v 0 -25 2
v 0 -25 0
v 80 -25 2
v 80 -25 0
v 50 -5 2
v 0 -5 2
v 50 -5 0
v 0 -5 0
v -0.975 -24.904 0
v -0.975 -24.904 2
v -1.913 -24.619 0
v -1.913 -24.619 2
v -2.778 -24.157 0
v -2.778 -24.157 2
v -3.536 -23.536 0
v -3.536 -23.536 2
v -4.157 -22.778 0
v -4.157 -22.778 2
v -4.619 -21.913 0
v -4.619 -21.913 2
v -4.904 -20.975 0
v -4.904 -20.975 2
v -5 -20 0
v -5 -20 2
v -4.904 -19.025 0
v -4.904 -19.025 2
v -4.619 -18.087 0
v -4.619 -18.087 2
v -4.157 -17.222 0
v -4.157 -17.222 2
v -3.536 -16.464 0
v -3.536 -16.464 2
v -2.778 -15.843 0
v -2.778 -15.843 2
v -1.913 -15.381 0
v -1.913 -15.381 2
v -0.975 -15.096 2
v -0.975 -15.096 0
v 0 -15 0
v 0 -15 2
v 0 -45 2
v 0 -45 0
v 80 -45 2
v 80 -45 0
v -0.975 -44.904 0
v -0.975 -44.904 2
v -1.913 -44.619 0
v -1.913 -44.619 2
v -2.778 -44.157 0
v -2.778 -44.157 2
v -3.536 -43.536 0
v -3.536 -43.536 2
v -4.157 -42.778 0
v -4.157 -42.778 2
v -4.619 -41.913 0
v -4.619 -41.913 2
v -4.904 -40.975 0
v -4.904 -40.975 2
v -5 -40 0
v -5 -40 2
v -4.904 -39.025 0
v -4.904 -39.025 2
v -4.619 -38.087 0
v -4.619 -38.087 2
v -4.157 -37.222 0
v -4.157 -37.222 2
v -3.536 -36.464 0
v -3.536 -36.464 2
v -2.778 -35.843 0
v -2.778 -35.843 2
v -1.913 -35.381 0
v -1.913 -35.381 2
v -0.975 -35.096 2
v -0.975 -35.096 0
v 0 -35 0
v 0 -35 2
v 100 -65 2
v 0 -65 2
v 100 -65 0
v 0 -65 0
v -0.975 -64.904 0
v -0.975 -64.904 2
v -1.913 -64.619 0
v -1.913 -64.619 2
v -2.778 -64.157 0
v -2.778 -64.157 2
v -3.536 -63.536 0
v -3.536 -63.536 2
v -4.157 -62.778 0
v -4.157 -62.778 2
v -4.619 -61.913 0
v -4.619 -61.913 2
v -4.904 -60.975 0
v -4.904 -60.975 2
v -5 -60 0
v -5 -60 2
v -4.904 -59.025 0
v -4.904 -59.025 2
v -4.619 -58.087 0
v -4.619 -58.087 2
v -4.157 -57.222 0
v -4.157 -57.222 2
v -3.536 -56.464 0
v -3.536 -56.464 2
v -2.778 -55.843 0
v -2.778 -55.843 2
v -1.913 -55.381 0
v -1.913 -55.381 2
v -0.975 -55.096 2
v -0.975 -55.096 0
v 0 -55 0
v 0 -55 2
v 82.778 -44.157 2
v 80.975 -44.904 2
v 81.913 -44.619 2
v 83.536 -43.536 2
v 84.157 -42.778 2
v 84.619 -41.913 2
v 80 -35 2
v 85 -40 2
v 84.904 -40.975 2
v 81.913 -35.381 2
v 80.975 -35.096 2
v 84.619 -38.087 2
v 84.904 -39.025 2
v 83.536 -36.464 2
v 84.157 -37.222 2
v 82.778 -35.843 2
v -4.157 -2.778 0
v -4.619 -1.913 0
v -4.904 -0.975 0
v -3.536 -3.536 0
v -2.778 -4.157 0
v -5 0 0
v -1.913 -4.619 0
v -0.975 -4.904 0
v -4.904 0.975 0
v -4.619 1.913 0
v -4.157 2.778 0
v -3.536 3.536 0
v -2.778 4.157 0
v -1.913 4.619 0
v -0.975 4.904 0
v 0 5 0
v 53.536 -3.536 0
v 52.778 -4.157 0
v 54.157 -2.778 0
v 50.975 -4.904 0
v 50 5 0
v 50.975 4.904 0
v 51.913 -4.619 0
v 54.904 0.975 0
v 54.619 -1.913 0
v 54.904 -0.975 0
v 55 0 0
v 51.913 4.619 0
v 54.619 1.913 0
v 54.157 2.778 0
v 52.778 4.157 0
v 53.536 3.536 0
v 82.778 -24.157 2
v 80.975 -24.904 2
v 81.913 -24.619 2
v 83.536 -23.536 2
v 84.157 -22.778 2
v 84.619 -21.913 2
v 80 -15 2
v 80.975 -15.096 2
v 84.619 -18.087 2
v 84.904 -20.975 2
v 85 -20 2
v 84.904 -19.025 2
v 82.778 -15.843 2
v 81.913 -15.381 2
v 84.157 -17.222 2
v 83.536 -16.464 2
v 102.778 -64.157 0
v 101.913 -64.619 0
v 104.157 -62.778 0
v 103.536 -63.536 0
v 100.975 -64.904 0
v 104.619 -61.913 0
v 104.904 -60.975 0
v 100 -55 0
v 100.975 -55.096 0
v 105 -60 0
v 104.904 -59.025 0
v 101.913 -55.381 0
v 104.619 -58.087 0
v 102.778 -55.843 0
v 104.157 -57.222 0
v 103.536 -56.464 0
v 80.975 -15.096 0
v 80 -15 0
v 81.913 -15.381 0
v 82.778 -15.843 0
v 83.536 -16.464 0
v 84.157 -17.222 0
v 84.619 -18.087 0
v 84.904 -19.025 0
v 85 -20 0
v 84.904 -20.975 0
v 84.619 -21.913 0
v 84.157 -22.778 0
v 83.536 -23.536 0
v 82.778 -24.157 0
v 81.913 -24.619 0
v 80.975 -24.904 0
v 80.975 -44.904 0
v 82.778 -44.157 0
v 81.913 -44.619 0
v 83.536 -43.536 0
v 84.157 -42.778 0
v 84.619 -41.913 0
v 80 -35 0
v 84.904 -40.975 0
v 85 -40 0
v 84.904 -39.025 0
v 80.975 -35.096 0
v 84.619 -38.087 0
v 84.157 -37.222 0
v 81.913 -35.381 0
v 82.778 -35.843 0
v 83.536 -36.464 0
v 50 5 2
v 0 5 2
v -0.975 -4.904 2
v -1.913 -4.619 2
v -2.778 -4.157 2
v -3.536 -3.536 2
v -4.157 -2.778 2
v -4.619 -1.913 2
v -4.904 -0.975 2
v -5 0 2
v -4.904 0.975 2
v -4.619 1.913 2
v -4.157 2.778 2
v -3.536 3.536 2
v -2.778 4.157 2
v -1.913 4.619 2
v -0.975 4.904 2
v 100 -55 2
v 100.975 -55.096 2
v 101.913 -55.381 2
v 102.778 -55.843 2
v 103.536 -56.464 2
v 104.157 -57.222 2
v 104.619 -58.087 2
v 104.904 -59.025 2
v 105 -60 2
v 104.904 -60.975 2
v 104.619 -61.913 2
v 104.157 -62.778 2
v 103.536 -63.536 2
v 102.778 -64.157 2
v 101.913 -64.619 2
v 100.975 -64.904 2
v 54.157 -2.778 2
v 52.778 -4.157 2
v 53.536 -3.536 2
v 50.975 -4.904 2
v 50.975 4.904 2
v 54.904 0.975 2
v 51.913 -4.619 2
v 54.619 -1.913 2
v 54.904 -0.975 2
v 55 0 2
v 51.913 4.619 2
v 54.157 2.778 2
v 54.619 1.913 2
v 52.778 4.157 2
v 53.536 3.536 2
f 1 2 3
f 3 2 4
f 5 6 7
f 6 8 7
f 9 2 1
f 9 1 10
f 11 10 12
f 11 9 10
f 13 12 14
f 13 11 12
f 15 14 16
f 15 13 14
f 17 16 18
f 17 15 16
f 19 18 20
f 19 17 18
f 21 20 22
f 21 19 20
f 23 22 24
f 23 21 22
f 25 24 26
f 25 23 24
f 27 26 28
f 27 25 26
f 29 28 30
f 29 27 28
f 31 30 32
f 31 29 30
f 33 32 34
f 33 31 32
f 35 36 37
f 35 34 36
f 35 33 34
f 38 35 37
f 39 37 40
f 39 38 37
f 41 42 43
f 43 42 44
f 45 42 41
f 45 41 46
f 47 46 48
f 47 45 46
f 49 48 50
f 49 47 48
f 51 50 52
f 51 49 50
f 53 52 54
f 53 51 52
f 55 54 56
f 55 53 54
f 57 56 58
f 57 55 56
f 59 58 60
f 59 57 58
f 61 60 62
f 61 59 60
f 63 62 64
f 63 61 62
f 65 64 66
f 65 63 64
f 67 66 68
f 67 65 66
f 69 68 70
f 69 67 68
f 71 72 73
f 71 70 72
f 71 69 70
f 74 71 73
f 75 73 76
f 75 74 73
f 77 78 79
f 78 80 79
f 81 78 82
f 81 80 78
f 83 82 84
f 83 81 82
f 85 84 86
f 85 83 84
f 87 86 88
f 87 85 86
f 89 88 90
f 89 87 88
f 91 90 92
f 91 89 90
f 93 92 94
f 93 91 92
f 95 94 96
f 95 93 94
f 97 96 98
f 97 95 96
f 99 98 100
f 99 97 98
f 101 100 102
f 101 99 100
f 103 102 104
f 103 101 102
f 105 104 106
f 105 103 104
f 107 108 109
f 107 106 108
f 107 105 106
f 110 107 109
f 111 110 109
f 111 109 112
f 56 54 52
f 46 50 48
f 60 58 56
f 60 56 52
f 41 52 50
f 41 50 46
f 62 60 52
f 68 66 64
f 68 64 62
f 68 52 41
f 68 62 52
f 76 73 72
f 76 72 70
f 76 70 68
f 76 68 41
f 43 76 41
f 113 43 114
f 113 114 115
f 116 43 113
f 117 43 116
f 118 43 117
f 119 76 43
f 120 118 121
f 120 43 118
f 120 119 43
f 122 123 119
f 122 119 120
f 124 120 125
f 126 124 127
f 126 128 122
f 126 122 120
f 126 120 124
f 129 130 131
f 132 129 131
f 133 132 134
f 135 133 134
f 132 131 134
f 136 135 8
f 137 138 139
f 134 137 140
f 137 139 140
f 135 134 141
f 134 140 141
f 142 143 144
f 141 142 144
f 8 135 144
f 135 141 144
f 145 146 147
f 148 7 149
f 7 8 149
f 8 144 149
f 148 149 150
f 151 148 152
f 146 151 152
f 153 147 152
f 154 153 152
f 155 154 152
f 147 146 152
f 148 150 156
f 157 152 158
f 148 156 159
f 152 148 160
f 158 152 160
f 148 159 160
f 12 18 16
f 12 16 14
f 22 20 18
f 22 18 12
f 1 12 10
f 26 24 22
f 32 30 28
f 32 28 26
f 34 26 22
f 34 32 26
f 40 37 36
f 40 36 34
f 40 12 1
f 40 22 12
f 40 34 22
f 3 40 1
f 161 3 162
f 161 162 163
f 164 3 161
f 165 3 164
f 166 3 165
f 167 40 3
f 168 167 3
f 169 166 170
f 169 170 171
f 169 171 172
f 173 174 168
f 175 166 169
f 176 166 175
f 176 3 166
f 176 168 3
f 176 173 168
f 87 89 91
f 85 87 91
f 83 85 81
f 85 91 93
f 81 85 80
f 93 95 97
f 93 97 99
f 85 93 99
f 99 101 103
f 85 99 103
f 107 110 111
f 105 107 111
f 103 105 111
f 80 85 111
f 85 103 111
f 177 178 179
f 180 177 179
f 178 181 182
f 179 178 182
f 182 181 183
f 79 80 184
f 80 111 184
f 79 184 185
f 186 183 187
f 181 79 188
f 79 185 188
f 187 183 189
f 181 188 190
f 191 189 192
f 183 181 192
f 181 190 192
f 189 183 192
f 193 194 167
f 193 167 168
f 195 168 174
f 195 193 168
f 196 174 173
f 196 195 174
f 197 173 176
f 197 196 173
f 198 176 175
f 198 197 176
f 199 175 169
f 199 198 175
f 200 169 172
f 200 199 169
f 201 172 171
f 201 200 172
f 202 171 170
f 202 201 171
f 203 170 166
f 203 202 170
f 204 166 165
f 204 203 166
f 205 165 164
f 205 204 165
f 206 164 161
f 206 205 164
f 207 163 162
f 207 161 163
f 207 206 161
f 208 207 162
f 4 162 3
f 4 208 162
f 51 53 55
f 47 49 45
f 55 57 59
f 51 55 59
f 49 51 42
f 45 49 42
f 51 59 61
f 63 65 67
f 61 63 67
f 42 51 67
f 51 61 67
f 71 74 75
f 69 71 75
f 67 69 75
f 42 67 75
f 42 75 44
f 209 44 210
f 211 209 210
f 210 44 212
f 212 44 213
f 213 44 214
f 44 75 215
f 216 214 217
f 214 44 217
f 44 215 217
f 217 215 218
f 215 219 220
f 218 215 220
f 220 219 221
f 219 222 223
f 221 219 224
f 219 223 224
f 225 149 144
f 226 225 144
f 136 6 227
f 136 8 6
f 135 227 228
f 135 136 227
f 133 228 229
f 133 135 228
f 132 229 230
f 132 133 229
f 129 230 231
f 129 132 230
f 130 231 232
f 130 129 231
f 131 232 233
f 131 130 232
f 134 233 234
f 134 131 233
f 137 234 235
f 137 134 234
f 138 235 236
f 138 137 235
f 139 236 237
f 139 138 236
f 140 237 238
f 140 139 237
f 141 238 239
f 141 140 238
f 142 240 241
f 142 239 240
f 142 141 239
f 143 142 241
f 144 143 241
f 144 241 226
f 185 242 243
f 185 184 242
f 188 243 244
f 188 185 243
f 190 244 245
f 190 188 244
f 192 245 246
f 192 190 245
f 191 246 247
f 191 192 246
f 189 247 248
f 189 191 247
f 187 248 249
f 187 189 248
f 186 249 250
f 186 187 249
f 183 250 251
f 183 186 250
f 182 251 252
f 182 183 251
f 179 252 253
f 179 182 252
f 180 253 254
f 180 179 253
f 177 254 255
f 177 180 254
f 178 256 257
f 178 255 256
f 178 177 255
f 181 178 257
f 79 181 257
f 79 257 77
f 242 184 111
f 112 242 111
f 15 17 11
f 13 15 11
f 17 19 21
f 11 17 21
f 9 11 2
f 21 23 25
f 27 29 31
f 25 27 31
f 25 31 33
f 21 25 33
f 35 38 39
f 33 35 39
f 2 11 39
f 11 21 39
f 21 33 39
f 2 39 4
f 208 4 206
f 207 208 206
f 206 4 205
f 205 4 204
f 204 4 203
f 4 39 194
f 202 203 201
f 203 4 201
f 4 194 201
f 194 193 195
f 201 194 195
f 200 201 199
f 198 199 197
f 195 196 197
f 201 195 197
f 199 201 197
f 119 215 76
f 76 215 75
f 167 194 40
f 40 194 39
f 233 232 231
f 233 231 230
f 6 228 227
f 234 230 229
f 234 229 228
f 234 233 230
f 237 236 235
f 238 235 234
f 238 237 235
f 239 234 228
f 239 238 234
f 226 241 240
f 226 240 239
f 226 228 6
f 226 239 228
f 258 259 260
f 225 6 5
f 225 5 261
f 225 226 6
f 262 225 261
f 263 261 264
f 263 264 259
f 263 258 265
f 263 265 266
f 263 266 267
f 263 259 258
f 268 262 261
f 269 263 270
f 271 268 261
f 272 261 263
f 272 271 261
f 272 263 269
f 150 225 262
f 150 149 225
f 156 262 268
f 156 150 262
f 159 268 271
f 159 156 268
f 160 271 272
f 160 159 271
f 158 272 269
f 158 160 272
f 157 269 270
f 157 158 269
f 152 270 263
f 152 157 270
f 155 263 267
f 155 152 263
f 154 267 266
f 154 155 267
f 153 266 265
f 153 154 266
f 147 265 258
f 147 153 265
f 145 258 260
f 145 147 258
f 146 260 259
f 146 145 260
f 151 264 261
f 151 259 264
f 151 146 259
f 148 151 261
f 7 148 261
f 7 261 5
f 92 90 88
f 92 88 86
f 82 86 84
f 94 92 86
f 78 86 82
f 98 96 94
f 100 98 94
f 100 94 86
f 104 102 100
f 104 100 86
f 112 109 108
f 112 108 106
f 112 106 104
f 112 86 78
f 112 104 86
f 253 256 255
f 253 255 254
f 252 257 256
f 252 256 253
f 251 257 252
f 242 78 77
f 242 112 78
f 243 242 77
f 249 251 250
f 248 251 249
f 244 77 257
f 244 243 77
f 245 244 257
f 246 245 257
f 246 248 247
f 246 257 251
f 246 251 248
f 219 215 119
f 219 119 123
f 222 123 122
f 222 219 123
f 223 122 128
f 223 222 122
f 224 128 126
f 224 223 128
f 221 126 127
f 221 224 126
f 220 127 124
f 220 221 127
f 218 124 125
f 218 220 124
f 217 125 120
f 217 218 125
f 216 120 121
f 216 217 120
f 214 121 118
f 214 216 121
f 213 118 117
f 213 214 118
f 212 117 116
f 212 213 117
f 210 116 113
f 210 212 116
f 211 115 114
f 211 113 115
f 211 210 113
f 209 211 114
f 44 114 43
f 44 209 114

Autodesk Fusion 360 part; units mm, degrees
sketch "Sketch1" plane through (0, 0, 0) normal (0, 0, 1) x (1, 0, 0)
  line L0 (0, -5) -> (50, -5)
  arc A0 (50, -5) -> (50, 5) centre (50, 0) ccw
  line L1 (50, 5) -> (0, 5)
  arc A1 (0, 5) -> (0, -5) centre (0, 0) ccw
  line L2 (0, 0) -> (50, 0) construction
  line L3 (0, -25) -> (80, -25)
  arc A2 (80, -25) -> (80, -15) centre (80, -20) ccw
  line L4 (80, -15) -> (0, -15)
  arc A3 (0, -15) -> (0, -25) centre (0, -20) ccw
  line L5 (0, -20) -> (80, -20) construction
  line L6 (0, -45) -> (80, -45)
  arc A4 (80, -45) -> (80, -35) centre (80, -40) ccw
  line L7 (80, -35) -> (0, -35)
  arc A5 (0, -35) -> (0, -45) centre (0, -40) ccw
  line L8 (0, -40) -> (80, -40) construction
  line L9 (0, -65) -> (100, -65)
  arc A6 (100, -65) -> (100, -55) centre (100, -60) ccw
  line L10 (100, -55) -> (0, -55)
  arc A7 (0, -55) -> (0, -65) centre (0, -60) ccw
  line L11 (0, -60) -> (100, -60) construction
  dimension "d1" = 10
  dimension "d2" = 10
  dimension "d3" = 10
  dimension "d4" = 10
extrude "Extrude1" add sketch "Sketch1" along normal blind 2 makes body 1 at (53.3333, -21.6667, 0) makes body 2 at (53.3333, -41.6667, 0) makes body 3 at (33.3333, -1.6667, 0) makes body 4 at (66.6667, -61.6667, 0) in component "Component"
copy_body "Body->Comp1" bodies 1 removing the originals makes body 5 in component "Component'"
copy_body "Body->Comp2" bodies 2 removing the originals makes body 6 in component "Component''"
copy_body "Body->Comp3" bodies 3 removing the originals makes body 7 in component "Component'''"
copy_body "Body->Comp4" bodies 4 removing the originals makes body 8 in component "Component''''"
component "Component" placed x (1, 0, 0) y (0, 1, 0) z (0, 0, 1) at (0, 0, 0)
component "Component'" placed x (1, 0, 0) y (0, 1, 0) z (0, 0, 1) at (0, 0, 0) in component "Component"
component "Component''" placed x (1, 0, 0) y (0, 1, 0) z (0, 0, 1) at (0, 0, 0) in component "Component"
component "Component'''" placed x (1, 0, 0) y (0, 1, 0) z (0, 0, 1) at (0, 0, 0) in component "Component"
component "Component''''" placed x (1, 0, 0) y (0, 1, 0) z (0, 0, 1) at (0, 0, 0) in component "Component"
